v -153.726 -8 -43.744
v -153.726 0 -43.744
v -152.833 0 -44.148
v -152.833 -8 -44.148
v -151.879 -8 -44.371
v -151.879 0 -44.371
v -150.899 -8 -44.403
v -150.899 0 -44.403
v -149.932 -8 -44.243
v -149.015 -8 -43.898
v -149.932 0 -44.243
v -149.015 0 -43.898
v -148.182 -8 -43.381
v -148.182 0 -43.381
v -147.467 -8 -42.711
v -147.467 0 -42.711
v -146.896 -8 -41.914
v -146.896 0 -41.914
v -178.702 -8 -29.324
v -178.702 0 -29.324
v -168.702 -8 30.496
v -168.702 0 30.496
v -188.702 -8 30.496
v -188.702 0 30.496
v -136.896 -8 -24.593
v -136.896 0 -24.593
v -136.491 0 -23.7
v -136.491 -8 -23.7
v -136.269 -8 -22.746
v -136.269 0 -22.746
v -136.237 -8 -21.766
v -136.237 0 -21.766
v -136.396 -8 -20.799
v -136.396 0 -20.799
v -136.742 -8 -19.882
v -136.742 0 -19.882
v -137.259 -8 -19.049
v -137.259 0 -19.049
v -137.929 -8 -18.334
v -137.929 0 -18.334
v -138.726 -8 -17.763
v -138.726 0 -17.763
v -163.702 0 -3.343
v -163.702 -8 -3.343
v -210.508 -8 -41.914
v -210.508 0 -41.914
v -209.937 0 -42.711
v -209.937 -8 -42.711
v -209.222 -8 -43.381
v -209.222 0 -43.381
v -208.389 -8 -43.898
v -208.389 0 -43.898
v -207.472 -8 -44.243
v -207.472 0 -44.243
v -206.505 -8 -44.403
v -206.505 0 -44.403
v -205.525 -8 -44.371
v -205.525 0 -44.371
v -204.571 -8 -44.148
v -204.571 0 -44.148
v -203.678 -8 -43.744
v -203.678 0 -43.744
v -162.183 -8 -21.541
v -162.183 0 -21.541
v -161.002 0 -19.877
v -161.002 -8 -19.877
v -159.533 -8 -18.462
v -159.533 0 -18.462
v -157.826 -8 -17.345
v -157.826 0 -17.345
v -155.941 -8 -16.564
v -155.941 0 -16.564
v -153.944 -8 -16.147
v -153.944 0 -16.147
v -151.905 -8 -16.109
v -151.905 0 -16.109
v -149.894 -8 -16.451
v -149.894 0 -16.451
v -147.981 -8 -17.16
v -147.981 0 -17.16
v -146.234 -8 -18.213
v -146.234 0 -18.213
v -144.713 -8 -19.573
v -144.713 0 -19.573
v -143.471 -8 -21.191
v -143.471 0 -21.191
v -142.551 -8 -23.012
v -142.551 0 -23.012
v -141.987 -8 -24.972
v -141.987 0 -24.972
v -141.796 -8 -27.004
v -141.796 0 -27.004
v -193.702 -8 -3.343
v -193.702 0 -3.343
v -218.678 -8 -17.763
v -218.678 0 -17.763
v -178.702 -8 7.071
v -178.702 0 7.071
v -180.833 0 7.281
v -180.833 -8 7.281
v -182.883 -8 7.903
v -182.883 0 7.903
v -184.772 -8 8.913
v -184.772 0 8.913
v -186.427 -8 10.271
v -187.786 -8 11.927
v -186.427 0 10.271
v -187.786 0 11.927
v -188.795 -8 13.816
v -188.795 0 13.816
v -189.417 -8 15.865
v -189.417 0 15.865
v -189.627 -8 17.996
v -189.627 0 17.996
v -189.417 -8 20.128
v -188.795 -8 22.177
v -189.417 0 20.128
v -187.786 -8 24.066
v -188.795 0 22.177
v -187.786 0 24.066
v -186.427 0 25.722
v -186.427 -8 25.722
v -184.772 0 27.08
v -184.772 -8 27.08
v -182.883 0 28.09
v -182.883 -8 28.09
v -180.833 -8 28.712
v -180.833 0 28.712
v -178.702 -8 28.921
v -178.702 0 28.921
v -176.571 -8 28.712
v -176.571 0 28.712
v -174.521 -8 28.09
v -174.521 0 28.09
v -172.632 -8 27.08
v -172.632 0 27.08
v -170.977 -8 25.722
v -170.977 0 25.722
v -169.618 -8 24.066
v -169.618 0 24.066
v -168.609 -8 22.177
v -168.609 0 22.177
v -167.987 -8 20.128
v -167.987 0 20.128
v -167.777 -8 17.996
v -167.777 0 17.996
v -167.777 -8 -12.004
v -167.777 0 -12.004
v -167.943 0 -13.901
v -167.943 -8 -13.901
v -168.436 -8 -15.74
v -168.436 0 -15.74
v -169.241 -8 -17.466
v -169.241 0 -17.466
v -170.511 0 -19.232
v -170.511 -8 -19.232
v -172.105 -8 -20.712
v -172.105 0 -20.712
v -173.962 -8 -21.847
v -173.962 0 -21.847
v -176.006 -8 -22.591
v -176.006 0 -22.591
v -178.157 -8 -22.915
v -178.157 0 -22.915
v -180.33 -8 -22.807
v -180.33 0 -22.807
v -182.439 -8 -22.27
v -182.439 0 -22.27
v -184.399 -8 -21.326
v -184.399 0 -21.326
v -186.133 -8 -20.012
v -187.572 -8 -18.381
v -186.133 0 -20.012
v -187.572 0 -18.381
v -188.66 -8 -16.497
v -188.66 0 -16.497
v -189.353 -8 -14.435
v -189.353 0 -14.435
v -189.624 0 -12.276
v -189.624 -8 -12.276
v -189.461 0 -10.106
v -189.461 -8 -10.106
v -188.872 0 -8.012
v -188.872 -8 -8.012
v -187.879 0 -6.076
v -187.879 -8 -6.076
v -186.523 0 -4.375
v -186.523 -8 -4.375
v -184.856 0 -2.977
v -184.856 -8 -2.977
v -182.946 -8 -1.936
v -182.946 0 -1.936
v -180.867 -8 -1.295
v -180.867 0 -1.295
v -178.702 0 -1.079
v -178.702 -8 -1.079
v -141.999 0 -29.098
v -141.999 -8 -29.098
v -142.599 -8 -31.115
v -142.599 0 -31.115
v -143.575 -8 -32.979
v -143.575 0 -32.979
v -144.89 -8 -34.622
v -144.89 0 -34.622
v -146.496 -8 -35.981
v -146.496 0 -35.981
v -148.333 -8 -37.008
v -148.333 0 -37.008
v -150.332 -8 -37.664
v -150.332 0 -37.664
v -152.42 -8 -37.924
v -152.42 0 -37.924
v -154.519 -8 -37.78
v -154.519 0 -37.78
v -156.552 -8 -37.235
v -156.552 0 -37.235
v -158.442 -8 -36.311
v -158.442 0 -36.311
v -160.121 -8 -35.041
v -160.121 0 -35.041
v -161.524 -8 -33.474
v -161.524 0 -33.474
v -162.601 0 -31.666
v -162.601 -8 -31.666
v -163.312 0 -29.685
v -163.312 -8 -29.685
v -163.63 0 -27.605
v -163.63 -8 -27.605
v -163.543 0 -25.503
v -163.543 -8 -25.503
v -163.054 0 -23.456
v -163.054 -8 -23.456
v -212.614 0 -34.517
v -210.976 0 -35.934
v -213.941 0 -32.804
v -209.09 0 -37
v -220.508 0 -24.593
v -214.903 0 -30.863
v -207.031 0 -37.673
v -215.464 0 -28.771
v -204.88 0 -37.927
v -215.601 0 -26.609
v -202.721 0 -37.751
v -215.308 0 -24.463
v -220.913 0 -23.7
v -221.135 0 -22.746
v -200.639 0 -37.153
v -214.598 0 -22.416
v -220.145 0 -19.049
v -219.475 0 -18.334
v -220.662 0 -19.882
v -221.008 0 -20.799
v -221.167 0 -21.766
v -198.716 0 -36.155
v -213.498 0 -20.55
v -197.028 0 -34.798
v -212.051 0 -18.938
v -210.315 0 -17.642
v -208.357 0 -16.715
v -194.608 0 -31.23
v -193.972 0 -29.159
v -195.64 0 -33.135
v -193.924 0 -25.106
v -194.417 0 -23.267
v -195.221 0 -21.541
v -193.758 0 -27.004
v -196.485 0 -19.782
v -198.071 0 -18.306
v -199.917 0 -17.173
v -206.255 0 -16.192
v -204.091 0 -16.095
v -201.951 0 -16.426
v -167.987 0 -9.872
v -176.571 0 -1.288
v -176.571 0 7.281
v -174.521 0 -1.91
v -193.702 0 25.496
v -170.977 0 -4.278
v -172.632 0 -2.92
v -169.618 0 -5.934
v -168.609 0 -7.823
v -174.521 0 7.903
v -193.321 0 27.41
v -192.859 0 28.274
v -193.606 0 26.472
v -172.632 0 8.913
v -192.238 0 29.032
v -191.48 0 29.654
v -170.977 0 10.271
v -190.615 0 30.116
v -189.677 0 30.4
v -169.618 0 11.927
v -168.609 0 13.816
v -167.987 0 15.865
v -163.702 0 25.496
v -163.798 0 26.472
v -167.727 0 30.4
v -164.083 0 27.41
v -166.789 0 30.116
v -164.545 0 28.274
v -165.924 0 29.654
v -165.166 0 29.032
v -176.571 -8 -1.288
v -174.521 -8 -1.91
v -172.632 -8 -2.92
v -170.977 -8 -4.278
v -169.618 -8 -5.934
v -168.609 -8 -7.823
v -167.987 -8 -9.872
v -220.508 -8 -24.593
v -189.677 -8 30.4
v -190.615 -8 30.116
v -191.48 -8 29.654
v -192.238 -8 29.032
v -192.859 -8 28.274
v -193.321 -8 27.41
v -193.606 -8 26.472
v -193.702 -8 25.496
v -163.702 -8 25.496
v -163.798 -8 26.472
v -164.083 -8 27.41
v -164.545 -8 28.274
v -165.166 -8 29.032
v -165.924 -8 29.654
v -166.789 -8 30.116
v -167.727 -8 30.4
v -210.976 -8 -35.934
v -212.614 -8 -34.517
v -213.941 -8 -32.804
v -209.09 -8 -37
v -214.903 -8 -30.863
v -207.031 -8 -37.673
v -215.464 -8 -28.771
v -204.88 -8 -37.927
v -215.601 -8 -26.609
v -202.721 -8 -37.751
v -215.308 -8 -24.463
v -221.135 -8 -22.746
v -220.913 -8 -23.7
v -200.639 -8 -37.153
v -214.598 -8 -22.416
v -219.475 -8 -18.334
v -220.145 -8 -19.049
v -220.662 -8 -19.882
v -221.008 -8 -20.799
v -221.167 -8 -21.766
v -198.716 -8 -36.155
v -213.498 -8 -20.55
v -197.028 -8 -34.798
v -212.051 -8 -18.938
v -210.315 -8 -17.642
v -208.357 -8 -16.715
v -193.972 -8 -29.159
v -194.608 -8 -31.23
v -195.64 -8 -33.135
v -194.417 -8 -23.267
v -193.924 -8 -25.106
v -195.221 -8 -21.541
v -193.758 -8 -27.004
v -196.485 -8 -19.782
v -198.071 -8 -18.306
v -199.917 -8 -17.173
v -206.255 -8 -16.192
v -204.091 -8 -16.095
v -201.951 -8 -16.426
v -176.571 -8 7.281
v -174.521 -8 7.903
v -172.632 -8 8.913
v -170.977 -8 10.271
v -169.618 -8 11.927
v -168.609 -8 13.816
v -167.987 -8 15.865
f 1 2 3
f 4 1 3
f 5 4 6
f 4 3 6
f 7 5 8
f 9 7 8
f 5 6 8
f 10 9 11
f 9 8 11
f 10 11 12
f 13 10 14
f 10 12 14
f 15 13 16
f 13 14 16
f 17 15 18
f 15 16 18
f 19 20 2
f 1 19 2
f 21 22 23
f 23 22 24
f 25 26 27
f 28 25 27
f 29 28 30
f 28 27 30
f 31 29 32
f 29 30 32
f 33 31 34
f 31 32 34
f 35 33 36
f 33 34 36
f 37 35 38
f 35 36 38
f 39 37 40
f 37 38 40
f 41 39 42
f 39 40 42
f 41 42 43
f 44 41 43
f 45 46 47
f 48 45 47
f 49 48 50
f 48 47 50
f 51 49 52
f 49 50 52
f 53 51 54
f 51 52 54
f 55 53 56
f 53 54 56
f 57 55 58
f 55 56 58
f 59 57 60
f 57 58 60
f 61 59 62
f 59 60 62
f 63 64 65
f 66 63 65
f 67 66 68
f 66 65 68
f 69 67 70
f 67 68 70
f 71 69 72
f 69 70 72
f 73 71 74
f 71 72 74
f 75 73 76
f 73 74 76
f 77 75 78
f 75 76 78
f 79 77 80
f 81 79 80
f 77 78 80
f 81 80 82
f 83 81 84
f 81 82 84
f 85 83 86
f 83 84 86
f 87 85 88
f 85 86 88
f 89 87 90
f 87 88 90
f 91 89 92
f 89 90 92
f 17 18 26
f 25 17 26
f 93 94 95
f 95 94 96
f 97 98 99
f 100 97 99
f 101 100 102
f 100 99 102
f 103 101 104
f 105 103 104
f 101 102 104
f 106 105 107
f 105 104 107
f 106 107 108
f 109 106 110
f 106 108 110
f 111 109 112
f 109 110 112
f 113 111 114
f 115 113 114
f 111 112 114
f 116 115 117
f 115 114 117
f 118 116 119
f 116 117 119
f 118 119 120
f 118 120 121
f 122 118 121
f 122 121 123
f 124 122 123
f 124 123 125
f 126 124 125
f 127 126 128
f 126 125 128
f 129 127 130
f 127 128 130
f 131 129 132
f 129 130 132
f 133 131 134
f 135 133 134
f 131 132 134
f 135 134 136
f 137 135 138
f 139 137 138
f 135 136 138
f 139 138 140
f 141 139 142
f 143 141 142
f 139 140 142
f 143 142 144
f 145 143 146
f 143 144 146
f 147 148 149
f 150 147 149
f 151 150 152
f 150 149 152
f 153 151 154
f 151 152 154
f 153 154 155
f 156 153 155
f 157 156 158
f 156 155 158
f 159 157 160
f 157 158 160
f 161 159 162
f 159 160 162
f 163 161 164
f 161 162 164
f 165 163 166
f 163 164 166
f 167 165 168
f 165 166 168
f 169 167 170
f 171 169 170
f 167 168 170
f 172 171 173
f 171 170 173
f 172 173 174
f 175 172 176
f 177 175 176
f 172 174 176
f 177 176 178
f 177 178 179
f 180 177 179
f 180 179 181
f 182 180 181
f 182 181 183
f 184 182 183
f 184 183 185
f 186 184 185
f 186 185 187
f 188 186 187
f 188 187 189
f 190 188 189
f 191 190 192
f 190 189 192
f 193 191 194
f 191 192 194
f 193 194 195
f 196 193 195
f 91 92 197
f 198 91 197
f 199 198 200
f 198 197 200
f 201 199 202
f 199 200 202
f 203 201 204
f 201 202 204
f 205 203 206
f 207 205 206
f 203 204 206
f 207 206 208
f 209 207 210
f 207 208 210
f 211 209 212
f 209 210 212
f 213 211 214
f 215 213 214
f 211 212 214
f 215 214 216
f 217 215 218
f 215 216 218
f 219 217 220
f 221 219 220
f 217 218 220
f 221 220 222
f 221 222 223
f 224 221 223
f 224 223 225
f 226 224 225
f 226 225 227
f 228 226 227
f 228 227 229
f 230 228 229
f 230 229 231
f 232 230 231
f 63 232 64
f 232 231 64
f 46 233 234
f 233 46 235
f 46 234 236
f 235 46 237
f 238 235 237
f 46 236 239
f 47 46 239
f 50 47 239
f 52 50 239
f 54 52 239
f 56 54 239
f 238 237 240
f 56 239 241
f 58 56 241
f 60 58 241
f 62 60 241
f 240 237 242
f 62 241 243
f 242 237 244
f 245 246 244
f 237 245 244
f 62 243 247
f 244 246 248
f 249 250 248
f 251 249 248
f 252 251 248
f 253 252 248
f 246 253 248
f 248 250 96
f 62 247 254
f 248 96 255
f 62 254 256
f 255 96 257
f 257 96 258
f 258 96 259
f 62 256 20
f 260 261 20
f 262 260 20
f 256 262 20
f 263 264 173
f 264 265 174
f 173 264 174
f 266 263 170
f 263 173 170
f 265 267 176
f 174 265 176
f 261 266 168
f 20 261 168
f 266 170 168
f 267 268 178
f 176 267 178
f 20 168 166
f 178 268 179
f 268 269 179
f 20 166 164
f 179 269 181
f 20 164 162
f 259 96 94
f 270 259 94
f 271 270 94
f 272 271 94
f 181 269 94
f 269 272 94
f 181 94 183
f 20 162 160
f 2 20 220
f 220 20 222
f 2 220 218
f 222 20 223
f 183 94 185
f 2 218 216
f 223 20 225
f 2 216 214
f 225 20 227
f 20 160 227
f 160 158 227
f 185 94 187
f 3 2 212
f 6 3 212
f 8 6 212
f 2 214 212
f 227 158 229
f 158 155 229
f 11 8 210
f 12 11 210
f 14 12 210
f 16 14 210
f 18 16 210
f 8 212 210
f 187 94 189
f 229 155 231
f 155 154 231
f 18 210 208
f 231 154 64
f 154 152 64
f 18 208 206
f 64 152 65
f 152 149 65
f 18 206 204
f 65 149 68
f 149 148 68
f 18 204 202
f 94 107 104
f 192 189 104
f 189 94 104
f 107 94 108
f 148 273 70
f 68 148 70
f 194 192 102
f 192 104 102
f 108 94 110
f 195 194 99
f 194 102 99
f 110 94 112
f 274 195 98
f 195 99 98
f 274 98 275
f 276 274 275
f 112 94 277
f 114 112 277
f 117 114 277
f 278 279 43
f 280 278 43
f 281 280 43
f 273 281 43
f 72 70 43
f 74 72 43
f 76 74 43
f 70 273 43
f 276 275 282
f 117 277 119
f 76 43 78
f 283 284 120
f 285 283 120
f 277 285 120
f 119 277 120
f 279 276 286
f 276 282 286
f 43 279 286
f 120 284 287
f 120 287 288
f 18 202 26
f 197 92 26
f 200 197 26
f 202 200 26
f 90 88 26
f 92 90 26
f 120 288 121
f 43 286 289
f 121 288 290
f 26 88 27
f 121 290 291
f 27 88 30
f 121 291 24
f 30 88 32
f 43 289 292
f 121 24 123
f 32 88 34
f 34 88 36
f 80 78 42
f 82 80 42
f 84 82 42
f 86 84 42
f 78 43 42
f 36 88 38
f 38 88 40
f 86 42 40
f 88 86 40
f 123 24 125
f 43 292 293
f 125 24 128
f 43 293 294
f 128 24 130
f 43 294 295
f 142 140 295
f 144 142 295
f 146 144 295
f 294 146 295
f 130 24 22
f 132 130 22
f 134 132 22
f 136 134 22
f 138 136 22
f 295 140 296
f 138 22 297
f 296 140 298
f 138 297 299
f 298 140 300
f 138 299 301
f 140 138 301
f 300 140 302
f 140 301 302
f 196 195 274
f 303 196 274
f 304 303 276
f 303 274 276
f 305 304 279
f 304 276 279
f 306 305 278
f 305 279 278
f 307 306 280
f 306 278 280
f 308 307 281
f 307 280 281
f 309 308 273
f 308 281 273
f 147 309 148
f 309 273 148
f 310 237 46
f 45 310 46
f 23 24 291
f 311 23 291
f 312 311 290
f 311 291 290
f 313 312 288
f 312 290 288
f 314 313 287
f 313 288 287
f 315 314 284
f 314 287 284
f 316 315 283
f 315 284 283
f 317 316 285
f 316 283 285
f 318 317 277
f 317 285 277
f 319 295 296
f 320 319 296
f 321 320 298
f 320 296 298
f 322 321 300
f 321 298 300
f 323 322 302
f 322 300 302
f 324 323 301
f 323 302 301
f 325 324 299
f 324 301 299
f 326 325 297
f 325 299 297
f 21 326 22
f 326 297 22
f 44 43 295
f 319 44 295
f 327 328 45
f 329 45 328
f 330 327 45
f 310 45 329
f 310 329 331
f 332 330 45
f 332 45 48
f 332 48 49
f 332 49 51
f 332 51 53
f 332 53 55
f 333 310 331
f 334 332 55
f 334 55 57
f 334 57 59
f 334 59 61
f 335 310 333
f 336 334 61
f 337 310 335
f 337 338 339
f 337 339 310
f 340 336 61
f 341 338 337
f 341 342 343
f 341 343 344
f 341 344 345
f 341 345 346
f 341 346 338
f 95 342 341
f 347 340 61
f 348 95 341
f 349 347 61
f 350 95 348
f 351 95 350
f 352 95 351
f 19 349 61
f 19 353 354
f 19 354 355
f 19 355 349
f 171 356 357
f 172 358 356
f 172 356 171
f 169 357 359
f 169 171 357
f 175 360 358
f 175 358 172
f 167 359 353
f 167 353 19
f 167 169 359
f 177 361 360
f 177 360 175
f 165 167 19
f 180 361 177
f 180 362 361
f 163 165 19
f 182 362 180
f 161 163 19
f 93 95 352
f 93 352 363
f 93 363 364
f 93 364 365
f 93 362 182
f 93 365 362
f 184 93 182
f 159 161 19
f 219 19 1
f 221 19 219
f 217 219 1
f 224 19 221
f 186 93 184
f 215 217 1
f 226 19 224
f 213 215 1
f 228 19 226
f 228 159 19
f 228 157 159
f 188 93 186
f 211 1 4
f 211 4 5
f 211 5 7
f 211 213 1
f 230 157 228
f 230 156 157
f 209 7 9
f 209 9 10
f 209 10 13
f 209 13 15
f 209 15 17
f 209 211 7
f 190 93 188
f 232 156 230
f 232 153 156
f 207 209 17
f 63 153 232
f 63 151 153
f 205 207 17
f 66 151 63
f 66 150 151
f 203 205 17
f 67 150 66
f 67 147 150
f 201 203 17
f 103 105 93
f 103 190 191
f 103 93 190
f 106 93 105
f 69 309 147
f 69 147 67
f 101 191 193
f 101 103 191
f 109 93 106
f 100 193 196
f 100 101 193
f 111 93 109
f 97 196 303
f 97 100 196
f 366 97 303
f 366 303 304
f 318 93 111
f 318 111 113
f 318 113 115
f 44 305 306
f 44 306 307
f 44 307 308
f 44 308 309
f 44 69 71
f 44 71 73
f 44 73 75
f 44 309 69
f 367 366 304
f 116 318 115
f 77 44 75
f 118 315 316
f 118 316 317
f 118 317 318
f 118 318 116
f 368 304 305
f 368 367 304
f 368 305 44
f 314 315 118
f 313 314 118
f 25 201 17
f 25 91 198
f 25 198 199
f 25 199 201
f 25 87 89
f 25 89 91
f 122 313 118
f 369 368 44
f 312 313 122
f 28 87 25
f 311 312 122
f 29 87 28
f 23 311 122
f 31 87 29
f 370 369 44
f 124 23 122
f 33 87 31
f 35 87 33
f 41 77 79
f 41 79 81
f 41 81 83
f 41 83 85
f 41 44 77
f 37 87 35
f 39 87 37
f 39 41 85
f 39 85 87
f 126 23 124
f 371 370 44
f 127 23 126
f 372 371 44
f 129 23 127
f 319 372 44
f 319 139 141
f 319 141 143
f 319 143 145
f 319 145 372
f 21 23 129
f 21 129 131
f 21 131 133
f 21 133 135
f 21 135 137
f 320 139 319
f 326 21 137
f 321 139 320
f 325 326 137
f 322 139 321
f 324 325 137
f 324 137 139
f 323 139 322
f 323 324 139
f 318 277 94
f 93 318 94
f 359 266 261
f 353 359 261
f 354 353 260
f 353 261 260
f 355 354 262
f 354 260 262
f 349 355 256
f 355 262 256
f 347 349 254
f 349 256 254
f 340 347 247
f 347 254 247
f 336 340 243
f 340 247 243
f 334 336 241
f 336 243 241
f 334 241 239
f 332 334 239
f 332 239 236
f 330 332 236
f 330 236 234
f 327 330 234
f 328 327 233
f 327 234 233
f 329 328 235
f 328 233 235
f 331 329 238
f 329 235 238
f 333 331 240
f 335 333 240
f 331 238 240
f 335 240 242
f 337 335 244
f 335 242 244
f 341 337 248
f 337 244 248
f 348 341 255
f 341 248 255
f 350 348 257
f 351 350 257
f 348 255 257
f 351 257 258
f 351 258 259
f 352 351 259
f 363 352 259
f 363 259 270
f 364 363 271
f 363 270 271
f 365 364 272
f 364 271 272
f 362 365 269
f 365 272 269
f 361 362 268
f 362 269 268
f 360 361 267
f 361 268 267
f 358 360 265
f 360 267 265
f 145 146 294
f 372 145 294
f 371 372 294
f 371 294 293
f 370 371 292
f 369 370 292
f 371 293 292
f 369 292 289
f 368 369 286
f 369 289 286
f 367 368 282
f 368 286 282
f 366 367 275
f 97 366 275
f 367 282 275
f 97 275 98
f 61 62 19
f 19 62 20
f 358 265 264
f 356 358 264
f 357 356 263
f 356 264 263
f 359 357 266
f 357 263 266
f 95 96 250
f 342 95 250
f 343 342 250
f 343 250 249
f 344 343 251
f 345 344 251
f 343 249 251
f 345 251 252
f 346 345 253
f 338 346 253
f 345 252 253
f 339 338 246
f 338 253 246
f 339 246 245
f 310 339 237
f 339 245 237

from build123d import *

# Parameters (mm, degrees)
F1_DEPTH = 8


with BuildPart() as f1:
    # F0 (on Front) → F1 (new body)
    with BuildSketch(Plane.XZ):
        with BuildLine():
            Line((-182.0272845483, 7.2368355937), (-178.701967001, 5.3169626126))
            Line((-178.701967001, 5.3169626126), (-175.3766494537, 7.2368355937))
            Line((-175.3766494537, 7.2368355937), (-172.0513319064, 1.4772166504))
            Line((-172.0513319064, 1.4772166504), (-163.701967001, -3.3432914252))
            Line((-163.701967001, -3.3432914252), (-163.701967001, 25.4964545369))
            ThreePointArc((-163.701967001, 25.4964545369), (-165.166433095, 29.0319884428), (-168.701967001, 30.4964545369))
            Line((-168.701967001, 30.4964545369), (-188.701967001, 30.4964545369))
            ThreePointArc((-188.701967001, 30.4964545369), (-192.2375009069, 29.0319884428), (-193.701967001, 25.4964545369))
            Line((-193.701967001, 25.4964545369), (-193.701967001, -3.3432914252))
            Line((-193.701967001, -3.3432914252), (-185.3526020956, 1.4772166504))
            Line((-185.3526020956, 1.4772166504), (-182.0272845483, 7.2368355937))
        make_face()
        with BuildLine():
            ThreePointArc((-167.776967001, 17.9964545369), (-170.9768254165, 10.2713129525), (-178.701967001, 7.0714545369))
            ThreePointArc((-178.701967001, 7.0714545369), (-186.4271085854, 25.7215961214), (-167.776967001, 17.9964545369))
        make_face(mode=Mode.SUBTRACT)
        with BuildLine():
            Line((-160.3766494537, -18.7439265199), (-163.701967001, -20.6637995009))
            Line((-163.701967001, -20.6637995009), (-163.701967001, -24.5035454631))
            Line((-163.701967001, -24.5035454631), (-170.3526020956, -24.5035454631))
            Line((-170.3526020956, -24.5035454631), (-178.701967001, -29.3240535388))
            Line((-178.701967001, -29.3240535388), (-153.726014359, -43.7439265199))
            ThreePointArc((-153.726014359, -43.7439265199), (-149.9319191335, -44.2434286324), (-146.8958873401, -41.9137995009))
            Line((-146.8958873401, -41.9137995009), (-136.8958873401, -24.5932914252))
            ThreePointArc((-136.8958873401, -24.5932914252), (-136.3963852276, -20.7991961997), (-138.726014359, -17.7631644063))
            Line((-138.726014359, -17.7631644063), (-163.701967001, -3.3432914252))
            Line((-163.701967001, -3.3432914252), (-163.701967001, -12.9843075766))
            Line((-163.701967001, -12.9843075766), (-160.3766494537, -18.7439265199))
        make_face()
        with BuildLine():
            ThreePointArc((-141.7962048874, -27.0035454631), (-155.5488029552, -37.5562851153), (-162.1825324238, -21.5410454631))
            ThreePointArc((-162.1825324238, -21.5410454631), (-149.8936068197, -16.4508058109), (-141.7962048874, -27.0035454631))
        make_face(mode=Mode.SUBTRACT)
        with BuildLine():
            Line((-193.701967001, -24.5035454631), (-193.701967001, -20.6637995009))
            Line((-193.701967001, -20.6637995009), (-197.0272845483, -18.7439265199))
            Line((-197.0272845483, -18.7439265199), (-193.701967001, -12.9843075766))
            Line((-193.701967001, -12.9843075766), (-193.701967001, -3.3432914252))
            Line((-193.701967001, -3.3432914252), (-218.6779196429, -17.7631644063))
            ThreePointArc((-218.6779196429, -17.7631644063), (-221.0075487743, -20.7991961997), (-220.5080466618, -24.5932914252))
            Line((-220.5080466618, -24.5932914252), (-210.5080466618, -41.9137995009))
            ThreePointArc((-210.5080466618, -41.9137995009), (-207.4720148684, -44.2434286324), (-203.6779196429, -43.7439265199))
            Line((-203.6779196429, -43.7439265199), (-178.701967001, -29.3240535388))
            Line((-178.701967001, -29.3240535388), (-187.0513319064, -24.5035454631))
            Line((-187.0513319064, -24.5035454631), (-193.701967001, -24.5035454631))
        make_face()
        with BuildLine():
            ThreePointArc((-193.7577291145, -27.0035454631), (-215.2354687667, -29.8311435308), (-195.2214015781, -21.5410454631))
            ThreePointArc((-195.2214015781, -21.5410454631), (-194.1299894623, -24.1759473953), (-193.7577291145, -27.0035454631))
        make_face(mode=Mode.SUBTRACT)
        Polygon((-193.701967001, -12.9843075766), (-185.3526020956, 1.4772166504), (-193.701967001, -3.3432914252), align=None)
        Polygon((-163.701967001, -3.3432914252), (-172.0513319064, 1.4772166504), (-163.701967001, -12.9843075766), align=None)
        Polygon((-178.701967001, -29.3240535388), (-170.3526020956, -24.5035454631), (-187.0513319064, -24.5035454631), align=None)
        with BuildLine():
            ThreePointArc((-188.1632945373, -17.4660454631), (-188.1632945373, -6.5410454631), (-178.701967001, -1.0785454631))
            Line((-178.701967001, -1.0785454631), (-178.701967001, 5.3169626126))
            Line((-178.701967001, 5.3169626126), (-185.3526020956, 1.4772166504))
            Line((-185.3526020956, 1.4772166504), (-193.701967001, -12.9843075766))
            Line((-193.701967001, -12.9843075766), (-193.701967001, -20.6637995009))
            Line((-193.701967001, -20.6637995009), (-188.1632945373, -17.4660454631))
        make_face()
        with BuildLine():
            ThreePointArc((-178.701967001, -1.0785454631), (-170.9768254165, -4.2784038786), (-167.776967001, -12.0035454631))
            ThreePointArc((-167.776967001, -12.0035454631), (-168.1492273488, -14.8311435308), (-169.2406394646, -17.4660454631))
            Line((-169.2406394646, -17.4660454631), (-163.701967001, -20.6637995009))
            Line((-163.701967001, -20.6637995009), (-163.701967001, -12.9843075766))
            Line((-163.701967001, -12.9843075766), (-172.0513319064, 1.4772166504))
            Line((-172.0513319064, 1.4772166504), (-178.701967001, 5.3169626126))
            Line((-178.701967001, 5.3169626126), (-178.701967001, -1.0785454631))
        make_face()
        Polygon((-175.3766494537, 7.2368355937), (-178.701967001, 5.3169626126), (-172.0513319064, 1.4772166504), align=None)
        Polygon((-185.3526020956, 1.4772166504), (-178.701967001, 5.3169626126), (-182.0272845483, 7.2368355937), align=None)
        with BuildLine():
            Line((-163.701967001, -20.6637995009), (-169.2406394646, -17.4660454631))
            ThreePointArc((-169.2406394646, -17.4660454631), (-178.701967001, -22.9285454631), (-188.1632945373, -17.4660454631))
            Line((-188.1632945373, -17.4660454631), (-193.701967001, -20.6637995009))
            Line((-193.701967001, -20.6637995009), (-187.0513319064, -24.5035454631))
            Line((-187.0513319064, -24.5035454631), (-170.3526020956, -24.5035454631))
            Line((-170.3526020956, -24.5035454631), (-163.701967001, -20.6637995009))
        make_face()
        Polygon((-163.701967001, -12.9843075766), (-163.701967001, -20.6637995009), (-160.3766494537, -18.7439265199), align=None)
        Polygon((-163.701967001, -24.5035454631), (-163.701967001, -20.6637995009), (-170.3526020956, -24.5035454631), align=None)
        Polygon((-187.0513319064, -24.5035454631), (-193.701967001, -20.6637995009), (-193.701967001, -24.5035454631), align=None)
        Polygon((-197.0272845483, -18.7439265199), (-193.701967001, -20.6637995009), (-193.701967001, -12.9843075766), align=None)
    extrude(amount=F1_DEPTH)


solid = f1.part
